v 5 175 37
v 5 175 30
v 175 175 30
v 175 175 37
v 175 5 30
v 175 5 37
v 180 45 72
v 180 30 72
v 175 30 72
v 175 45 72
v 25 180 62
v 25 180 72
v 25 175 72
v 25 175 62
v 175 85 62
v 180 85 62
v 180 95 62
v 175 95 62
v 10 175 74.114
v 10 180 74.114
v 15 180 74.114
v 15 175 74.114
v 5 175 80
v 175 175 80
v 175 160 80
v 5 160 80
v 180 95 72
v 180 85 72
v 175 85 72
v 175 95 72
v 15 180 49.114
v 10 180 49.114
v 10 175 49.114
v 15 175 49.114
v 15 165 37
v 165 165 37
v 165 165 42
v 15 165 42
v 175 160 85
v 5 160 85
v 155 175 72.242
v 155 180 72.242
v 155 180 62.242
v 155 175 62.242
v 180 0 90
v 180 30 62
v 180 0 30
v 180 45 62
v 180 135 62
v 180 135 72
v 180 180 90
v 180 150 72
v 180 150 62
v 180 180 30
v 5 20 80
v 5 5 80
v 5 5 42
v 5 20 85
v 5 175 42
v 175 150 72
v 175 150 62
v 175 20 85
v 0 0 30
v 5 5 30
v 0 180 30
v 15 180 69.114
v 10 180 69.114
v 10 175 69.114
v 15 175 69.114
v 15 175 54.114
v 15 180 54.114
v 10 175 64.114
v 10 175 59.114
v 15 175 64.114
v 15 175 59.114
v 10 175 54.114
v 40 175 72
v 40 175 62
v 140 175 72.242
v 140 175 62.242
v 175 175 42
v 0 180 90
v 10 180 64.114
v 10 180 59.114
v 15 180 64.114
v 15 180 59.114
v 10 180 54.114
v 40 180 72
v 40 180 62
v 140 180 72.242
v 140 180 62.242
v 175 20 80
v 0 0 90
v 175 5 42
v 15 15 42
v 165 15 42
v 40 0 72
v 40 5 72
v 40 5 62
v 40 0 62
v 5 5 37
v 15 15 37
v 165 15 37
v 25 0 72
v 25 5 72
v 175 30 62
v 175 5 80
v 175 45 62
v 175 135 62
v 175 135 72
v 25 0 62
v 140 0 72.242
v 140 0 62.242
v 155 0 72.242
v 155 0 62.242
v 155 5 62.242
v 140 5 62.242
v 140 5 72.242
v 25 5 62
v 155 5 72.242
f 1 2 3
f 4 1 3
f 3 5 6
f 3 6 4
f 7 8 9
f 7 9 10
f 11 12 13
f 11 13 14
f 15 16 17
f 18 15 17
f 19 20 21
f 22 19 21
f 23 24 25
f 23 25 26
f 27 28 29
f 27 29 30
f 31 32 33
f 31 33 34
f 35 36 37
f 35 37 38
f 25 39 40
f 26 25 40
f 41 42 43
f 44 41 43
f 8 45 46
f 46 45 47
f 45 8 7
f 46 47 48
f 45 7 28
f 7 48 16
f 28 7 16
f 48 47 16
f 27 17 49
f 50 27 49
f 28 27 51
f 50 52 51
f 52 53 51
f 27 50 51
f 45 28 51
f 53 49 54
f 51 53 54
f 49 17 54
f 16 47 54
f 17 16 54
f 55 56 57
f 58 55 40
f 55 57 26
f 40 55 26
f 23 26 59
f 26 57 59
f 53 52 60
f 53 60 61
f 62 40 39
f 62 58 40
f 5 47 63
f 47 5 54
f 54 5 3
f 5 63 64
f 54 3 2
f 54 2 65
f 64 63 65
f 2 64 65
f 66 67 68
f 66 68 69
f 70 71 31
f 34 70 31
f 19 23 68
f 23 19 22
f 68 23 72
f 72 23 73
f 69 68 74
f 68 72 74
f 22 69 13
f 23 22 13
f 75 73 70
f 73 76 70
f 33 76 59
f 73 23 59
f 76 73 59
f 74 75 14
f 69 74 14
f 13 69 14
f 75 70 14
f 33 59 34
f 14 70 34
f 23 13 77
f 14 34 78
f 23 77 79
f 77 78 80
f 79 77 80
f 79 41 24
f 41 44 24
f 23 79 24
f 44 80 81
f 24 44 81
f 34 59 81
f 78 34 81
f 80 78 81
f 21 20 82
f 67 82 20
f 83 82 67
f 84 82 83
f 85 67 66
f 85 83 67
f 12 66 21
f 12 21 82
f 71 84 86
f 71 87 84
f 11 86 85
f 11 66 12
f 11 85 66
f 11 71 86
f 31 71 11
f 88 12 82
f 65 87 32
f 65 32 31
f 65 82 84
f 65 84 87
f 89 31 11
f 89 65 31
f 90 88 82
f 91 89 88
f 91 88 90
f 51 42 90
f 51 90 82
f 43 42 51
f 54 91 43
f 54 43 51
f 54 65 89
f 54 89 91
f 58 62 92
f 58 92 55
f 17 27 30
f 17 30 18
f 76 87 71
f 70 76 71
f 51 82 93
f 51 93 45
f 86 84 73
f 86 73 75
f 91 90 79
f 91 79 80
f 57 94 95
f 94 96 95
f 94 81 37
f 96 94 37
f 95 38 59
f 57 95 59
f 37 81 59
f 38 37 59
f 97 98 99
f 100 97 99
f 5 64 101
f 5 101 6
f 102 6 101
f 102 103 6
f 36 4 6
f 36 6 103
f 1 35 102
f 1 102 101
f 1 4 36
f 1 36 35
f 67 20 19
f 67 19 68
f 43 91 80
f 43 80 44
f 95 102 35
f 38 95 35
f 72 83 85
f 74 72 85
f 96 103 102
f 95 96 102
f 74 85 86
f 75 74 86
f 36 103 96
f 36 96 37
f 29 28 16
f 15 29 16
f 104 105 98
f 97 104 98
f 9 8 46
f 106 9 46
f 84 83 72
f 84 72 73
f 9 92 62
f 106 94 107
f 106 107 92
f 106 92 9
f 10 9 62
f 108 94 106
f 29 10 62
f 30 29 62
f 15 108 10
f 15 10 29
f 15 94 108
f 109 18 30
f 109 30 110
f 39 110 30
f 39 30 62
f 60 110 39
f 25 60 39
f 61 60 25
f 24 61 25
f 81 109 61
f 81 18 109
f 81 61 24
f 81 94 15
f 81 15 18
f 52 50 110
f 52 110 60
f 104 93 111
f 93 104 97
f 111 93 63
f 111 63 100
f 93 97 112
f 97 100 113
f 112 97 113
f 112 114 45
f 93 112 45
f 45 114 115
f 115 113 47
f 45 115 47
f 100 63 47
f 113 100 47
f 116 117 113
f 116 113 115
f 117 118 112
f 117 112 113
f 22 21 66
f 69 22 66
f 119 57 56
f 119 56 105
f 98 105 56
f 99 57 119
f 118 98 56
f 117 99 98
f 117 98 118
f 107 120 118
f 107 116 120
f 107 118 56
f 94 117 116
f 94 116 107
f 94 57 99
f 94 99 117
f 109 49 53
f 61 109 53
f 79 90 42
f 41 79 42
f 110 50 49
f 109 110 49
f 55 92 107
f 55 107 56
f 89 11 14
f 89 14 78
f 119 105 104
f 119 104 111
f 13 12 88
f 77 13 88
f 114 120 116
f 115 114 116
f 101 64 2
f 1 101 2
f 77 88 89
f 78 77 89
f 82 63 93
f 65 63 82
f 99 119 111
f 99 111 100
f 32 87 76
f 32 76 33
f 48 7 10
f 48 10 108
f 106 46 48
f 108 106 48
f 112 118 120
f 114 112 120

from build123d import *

# Parameters (mm, degrees)
SKETCH1_W            = 180
SKETCH1_H            = 180
BOSS_EXTRUDE1_DEPTH  = 10
SKETCH2_W            = 180
SKETCH2_H            = 180
SKETCH2_W_2          = 160
SKETCH2_H_2          = 160
BOSS_EXTRUDE2_DEPTH  = 80
SKETCH3_W            = 160
SKETCH3_H            = 20
BOSS_EXTRUDE4_DEPTH  = 20
SKETCH5_W            = 20
SKETCH5_H            = 180
CUT_EXTRUDE1_DEPTH   = 300
SKETCH6_W            = 160
SKETCH6_H            = 20
CUT_EXTRUDE2_DEPTH   = 5
SKETCH9_W            = 160
SKETCH9_H            = 15
BOSS_EXTRUDE6_DEPTH  = 10
SKETCH11_W           = 28
SKETCH11_H           = 77
CUT_EXTRUDE4_DEPTH   = 10
SKETCH13_W           = 10
SKETCH13_H           = 10
CUT_EXTRUDE5_DEPTH   = 10
SKETCH15_W           = 10
SKETCH15_H           = 180
BOSS_EXTRUDE7_DEPTH  = 30
SKETCH16_W           = 10
SKETCH16_H           = 15
CUT_EXTRUDE6_DEPTH   = 30
SKETCH17_W           = 10
SKETCH17_H           = 10
CUT_EXTRUDE7_DEPTH   = 300
SKETCH22_W           = 20.069553575
SKETCH22_H           = 29.294084881
BOSS_EXTRUDE8_DEPTH  = 10
SKETCH23_W           = 10
SKETCH23_H           = 10
CUT_EXTRUDE11_DEPTH  = 10
SKETCH24_W           = 180
SKETCH24_H           = 30
CUT_EXTRUDE12_DEPTH  = 300
SKETCH26_W           = 18
SKETCH26_H           = 77
BOSS_EXTRUDE9_DEPTH  = 10
SKETCH27_W           = 160
SKETCH27_H           = 160
CUT_EXTRUDE13_DEPTH  = 10
SKETCH28_W           = 180
SKETCH28_H           = 7.5
BOSS_EXTRUDE10_DEPTH = 180
SKETCH29_W           = 160
SKETCH29_H           = 10
BOSS_EXTRUDE11_DEPTH = 5
SKETCH34_W           = 170
SKETCH34_H           = 170
CUT_EXTRUDE14_DEPTH  = 40
SKETCH35_W           = 180
SKETCH35_H           = 180
SKETCH35_W_2         = 170
SKETCH35_H_2         = 170
BOSS_EXTRUDE13_DEPTH = 20
SKETCH36_W           = 180
SKETCH36_H           = 5
BOSS_EXTRUDE14_DEPTH = 180
SKETCH37_W           = 180
SKETCH37_H           = 180
SKETCH37_W_2         = 170
SKETCH37_H_2         = 170
BOSS_EXTRUDE15_DEPTH = 40
SKETCH38_W           = 170
SKETCH38_H           = 15
BOSS_EXTRUDE16_DEPTH = 5
SKETCH39_W           = 10
SKETCH39_H           = 15
SKETCH39_H_2         = 10
CUT_EXTRUDE15_DEPTH  = 5
SKETCH40_W           = 15
SKETCH40_H           = 10
CUT_EXTRUDE16_DEPTH  = 300
SKETCH44_W           = 170
SKETCH44_H           = 170
SKETCH44_W_2         = 150
SKETCH44_H_2         = 150
BOSS_EXTRUDE17_DEPTH = 5
SKETCH45_W           = 5
SKETCH45_H           = 5
CUT_EXTRUDE17_DEPTH  = 5
SKETCH46_W           = 15
SKETCH46_H           = 10
CUT_EXTRUDE18_DEPTH  = 300


with BuildPart() as part:
    # Sketch1 → Boss-Extrude1 (new body)
    with BuildSketch(Plane.XY):
        with Locations((90, 90)):
            Rectangle(SKETCH1_W, SKETCH1_H)
    extrude(amount=BOSS_EXTRUDE1_DEPTH)

    # Sketch2 → Boss-Extrude2 (add)
    with BuildSketch(Plane.XY.offset(10)):
        with Locations((90, 90)):
            Rectangle(SKETCH2_W, SKETCH2_H)
        with Locations((90, 90)):
            Rectangle(SKETCH2_W_2, SKETCH2_H_2, mode=Mode.SUBTRACT)
    extrude(amount=BOSS_EXTRUDE2_DEPTH)

    # Sketch3 → Boss-Extrude4 (add)
    with BuildSketch(Plane.XY.offset(10)):
        with Locations((90, 20)):
            Rectangle(SKETCH3_W, SKETCH3_H)
        with Locations((90, 160)):
            Rectangle(SKETCH3_W, SKETCH3_H)
    extrude(amount=BOSS_EXTRUDE4_DEPTH)

    # Sketch5 → Cut-Extrude1 (cut)
    with BuildSketch(Plane(origin=(180, 0, 0), x_dir=(0, 0, -1), z_dir=(1, 0, 0))):
        with Locations((-80, 90)):
            Rectangle(SKETCH5_W, SKETCH5_H)
    extrude(amount=-CUT_EXTRUDE1_DEPTH, mode=Mode.SUBTRACT)

    # Sketch6 → Cut-Extrude2 (cut)
    with BuildSketch(Plane.XY.offset(30)):
        with Locations((90, 160)):
            Rectangle(SKETCH6_W, SKETCH6_H)
        with Locations((90, 20)):
            Rectangle(SKETCH6_W, SKETCH6_H)
    extrude(amount=-CUT_EXTRUDE2_DEPTH, mode=Mode.SUBTRACT)

    # Sketch9 → Boss-Extrude6 (add)
    with BuildSketch(Plane.XY.offset(62)):
        with Locations((90, 17.5)):
            Rectangle(SKETCH9_W, SKETCH9_H)
        with Locations((90, 162.5)):
            Rectangle(SKETCH9_W, SKETCH9_H)
    extrude(amount=-BOSS_EXTRUDE6_DEPTH)

    # Sketch11 → Cut-Extrude4 (cut)
    with BuildSketch(Plane.ZY):
        with Locations((34, 83.5)):
            Rectangle(SKETCH11_W, SKETCH11_H)
    extrude(amount=-CUT_EXTRUDE4_DEPTH, mode=Mode.SUBTRACT)

    # Sketch13 → Cut-Extrude5 (cut)
    with BuildSketch(Plane(origin=(180, 0, 0), x_dir=(0, 0, -1), z_dir=(1, 0, 0))):
        with Locations((-45.269958147, 35)):
            Rectangle(SKETCH13_W, SKETCH13_H)
        with Locations((-45.269958147, 145)):
            Rectangle(SKETCH13_W, SKETCH13_H)
        with Locations((-45.269958147, 90)):
            Rectangle(SKETCH13_W, SKETCH13_H)
    extrude(amount=-CUT_EXTRUDE5_DEPTH, mode=Mode.SUBTRACT)

    # Sketch15 → Boss-Extrude7 (add)
    with BuildSketch(Plane.XY.offset(70)):
        with Locations((175, 90)):
            Rectangle(SKETCH15_W, SKETCH15_H)
    extrude(amount=-BOSS_EXTRUDE7_DEPTH)

    # Sketch16 → Cut-Extrude6 (cut)
    with BuildSketch(Plane(origin=(180, 0, 0), x_dir=(0, 0, -1), z_dir=(1, 0, 0))):
        with Locations((-45, 37.5)):
            Rectangle(SKETCH16_W, SKETCH16_H)
        with Locations((-45, 90)):
            Rectangle(SKETCH16_W, SKETCH16_H)
        with Locations((-45, 142.5)):
            Rectangle(SKETCH16_W, SKETCH16_H)
    extrude(amount=-CUT_EXTRUDE6_DEPTH, mode=Mode.SUBTRACT)

    # Sketch17 → Cut-Extrude7 (cut)
    with BuildSketch(Plane(origin=(0, 180, 0), x_dir=(1, 0, 0), z_dir=(0, 1, 0))):
        with Locations((25, -45)):
            Rectangle(SKETCH17_W, SKETCH17_H)
        with Locations((155, -45)):
            Rectangle(SKETCH17_W, SKETCH17_H)
    extrude(amount=-CUT_EXTRUDE7_DEPTH, mode=Mode.SUBTRACT)

    # Sketch22 → Boss-Extrude8 (add)
    with BuildSketch(Plane(origin=(180, 0, 0), x_dir=(0, 0, -1), z_dir=(1, 0, 0))):
        with Locations((-44.930981983, 90.571261677)):
            Rectangle(SKETCH22_W, SKETCH22_H)
    extrude(amount=-BOSS_EXTRUDE8_DEPTH)

    # Sketch23 → Cut-Extrude11 (cut)
    with BuildSketch(Plane.XZ):
        with Locations((25, 25)):
            Rectangle(SKETCH23_W, SKETCH23_H)
    extrude(amount=-CUT_EXTRUDE11_DEPTH, mode=Mode.SUBTRACT)

    # Sketch24 → Cut-Extrude12 (cut)
    with BuildSketch(Plane(origin=(0, 180, 0), x_dir=(1, 0, 0), z_dir=(0, 1, 0))):
        with Locations((90, -15)):
            Rectangle(SKETCH24_W, SKETCH24_H)
    extrude(amount=-CUT_EXTRUDE12_DEPTH, mode=Mode.SUBTRACT)

    # Sketch26 → Boss-Extrude9 (add)
    with BuildSketch(Plane.ZY):
        with Locations((39, 83.5)):
            Rectangle(SKETCH26_W, SKETCH26_H)
    extrude(amount=-BOSS_EXTRUDE9_DEPTH)

    # Sketch27 → Cut-Extrude13 (cut)
    with BuildSketch(Plane.XY.offset(62)):
        with Locations((90, 90)):
            Rectangle(SKETCH27_W, SKETCH27_H)
    extrude(amount=-CUT_EXTRUDE13_DEPTH, mode=Mode.SUBTRACT)

    # Sketch28 → Boss-Extrude10 (add)
    with BuildSketch(Plane(origin=(0, 180, 0), x_dir=(1, 0, 0), z_dir=(0, 1, 0))):
        with Locations((90, -66.25)):
            Rectangle(SKETCH28_W, SKETCH28_H)
    extrude(amount=-BOSS_EXTRUDE10_DEPTH)

    # Sketch29 → Boss-Extrude11 (add)
    with BuildSketch(Plane(origin=(0, 0, 62.5), x_dir=(-1, 0, 0), z_dir=(0, 0, -1))):
        with Locations((-90, 165)):
            Rectangle(SKETCH29_W, SKETCH29_H)
        with Locations((-90, 15)):
            Rectangle(SKETCH29_W, SKETCH29_H)
    extrude(amount=BOSS_EXTRUDE11_DEPTH)

    # Sketch34 → Cut-Extrude14 (cut)
    with BuildSketch(Plane(origin=(0, 0, 30), x_dir=(-1, 0, 0), z_dir=(0, 0, -1))):
        with Locations((-90, 90)):
            Rectangle(SKETCH34_W, SKETCH34_H)
    extrude(amount=-CUT_EXTRUDE14_DEPTH, mode=Mode.SUBTRACT)

    # Sketch35 → Boss-Extrude13 (add)
    with BuildSketch(Plane.XY.offset(70)):
        with Locations((90, 90)):
            Rectangle(SKETCH35_W, SKETCH35_H)
        with Locations((90, 90)):
            Rectangle(SKETCH35_W_2, SKETCH35_H_2, mode=Mode.SUBTRACT)
    extrude(amount=BOSS_EXTRUDE13_DEPTH)

    # Sketch36 → Boss-Extrude14 (add)
    with BuildSketch(Plane.XZ):
        with Locations((90, 87.5)):
            Rectangle(SKETCH36_W, SKETCH36_H)
    extrude(amount=-BOSS_EXTRUDE14_DEPTH)

    # Sketch37 → Boss-Extrude15 (add)
    with BuildSketch(Plane(origin=(0, 0, 30), x_dir=(-1, 0, 0), z_dir=(0, 0, -1))):
        with Locations((-90, 90)):
            Rectangle(SKETCH37_W, SKETCH37_H)
        with Locations((-90, 90)):
            Rectangle(SKETCH37_W_2, SKETCH37_H_2, mode=Mode.SUBTRACT)
    extrude(amount=-BOSS_EXTRUDE15_DEPTH)

    # Sketch38 → Boss-Extrude16 (add)
    with BuildSketch(Plane(origin=(0, 0, 85), x_dir=(-1, 0, 0), z_dir=(0, 0, -1))):
        with Locations((-90, 167.5)):
            Rectangle(SKETCH38_W, SKETCH38_H)
        with Locations((-90, 12.5)):
            Rectangle(SKETCH38_W, SKETCH38_H)
    extrude(amount=BOSS_EXTRUDE16_DEPTH)

    # Sketch39 → Cut-Extrude15 (cut)
    with BuildSketch(Plane(origin=(180, 0, 0), x_dir=(0, 0, -1), z_dir=(1, 0, 0))):
        with Locations((-67, 142.5)):
            Rectangle(SKETCH39_W, SKETCH39_H)
        with Locations((-67, 37.5)):
            Rectangle(SKETCH39_W, SKETCH39_H)
        with Locations((-67, 90)):
            Rectangle(SKETCH39_W, SKETCH39_H_2)
    extrude(amount=-CUT_EXTRUDE15_DEPTH, mode=Mode.SUBTRACT)

    # Sketch40 → Cut-Extrude16 (cut)
    with BuildSketch(Plane(origin=(0, 180, 0), x_dir=(1, 0, 0), z_dir=(0, 1, 0))):
        with Locations((32.5, -67)):
            Rectangle(SKETCH40_W, SKETCH40_H)
    extrude(amount=-CUT_EXTRUDE16_DEPTH, mode=Mode.SUBTRACT)

    # Sketch44 → Boss-Extrude17 (add)
    with BuildSketch(Plane(origin=(0, 0, 37), x_dir=(-1, 0, 0), z_dir=(0, 0, -1))):
        with Locations((-90, 90)):
            Rectangle(SKETCH44_W, SKETCH44_H)
        with Locations((-90, 90)):
            Rectangle(SKETCH44_W_2, SKETCH44_H_2, mode=Mode.SUBTRACT)
    extrude(amount=-BOSS_EXTRUDE17_DEPTH)

    # Sketch45 → Cut-Extrude17 (cut)
    with BuildSketch(Plane(origin=(0, 180, 0), x_dir=(1, 0, 0), z_dir=(0, 1, 0))):
        with Locations((12.5, -61.614476268)):
            Rectangle(SKETCH45_W, SKETCH45_H)
        with Locations((12.5, -51.614476268)):
            Rectangle(SKETCH45_W, SKETCH45_H)
        with Locations((12.5, -71.614476268)):
            Rectangle(SKETCH45_W, SKETCH45_H)
    extrude(amount=-CUT_EXTRUDE17_DEPTH, mode=Mode.SUBTRACT)

    # Sketch46 → Cut-Extrude18 (cut)
    with BuildSketch(Plane(origin=(0, 180, 0), x_dir=(1, 0, 0), z_dir=(0, 1, 0))):
        with Locations((147.5, -67.241667744)):
            Rectangle(SKETCH46_W, SKETCH46_H)
    extrude(amount=-CUT_EXTRUDE18_DEPTH, mode=Mode.SUBTRACT)


solid = part.part
